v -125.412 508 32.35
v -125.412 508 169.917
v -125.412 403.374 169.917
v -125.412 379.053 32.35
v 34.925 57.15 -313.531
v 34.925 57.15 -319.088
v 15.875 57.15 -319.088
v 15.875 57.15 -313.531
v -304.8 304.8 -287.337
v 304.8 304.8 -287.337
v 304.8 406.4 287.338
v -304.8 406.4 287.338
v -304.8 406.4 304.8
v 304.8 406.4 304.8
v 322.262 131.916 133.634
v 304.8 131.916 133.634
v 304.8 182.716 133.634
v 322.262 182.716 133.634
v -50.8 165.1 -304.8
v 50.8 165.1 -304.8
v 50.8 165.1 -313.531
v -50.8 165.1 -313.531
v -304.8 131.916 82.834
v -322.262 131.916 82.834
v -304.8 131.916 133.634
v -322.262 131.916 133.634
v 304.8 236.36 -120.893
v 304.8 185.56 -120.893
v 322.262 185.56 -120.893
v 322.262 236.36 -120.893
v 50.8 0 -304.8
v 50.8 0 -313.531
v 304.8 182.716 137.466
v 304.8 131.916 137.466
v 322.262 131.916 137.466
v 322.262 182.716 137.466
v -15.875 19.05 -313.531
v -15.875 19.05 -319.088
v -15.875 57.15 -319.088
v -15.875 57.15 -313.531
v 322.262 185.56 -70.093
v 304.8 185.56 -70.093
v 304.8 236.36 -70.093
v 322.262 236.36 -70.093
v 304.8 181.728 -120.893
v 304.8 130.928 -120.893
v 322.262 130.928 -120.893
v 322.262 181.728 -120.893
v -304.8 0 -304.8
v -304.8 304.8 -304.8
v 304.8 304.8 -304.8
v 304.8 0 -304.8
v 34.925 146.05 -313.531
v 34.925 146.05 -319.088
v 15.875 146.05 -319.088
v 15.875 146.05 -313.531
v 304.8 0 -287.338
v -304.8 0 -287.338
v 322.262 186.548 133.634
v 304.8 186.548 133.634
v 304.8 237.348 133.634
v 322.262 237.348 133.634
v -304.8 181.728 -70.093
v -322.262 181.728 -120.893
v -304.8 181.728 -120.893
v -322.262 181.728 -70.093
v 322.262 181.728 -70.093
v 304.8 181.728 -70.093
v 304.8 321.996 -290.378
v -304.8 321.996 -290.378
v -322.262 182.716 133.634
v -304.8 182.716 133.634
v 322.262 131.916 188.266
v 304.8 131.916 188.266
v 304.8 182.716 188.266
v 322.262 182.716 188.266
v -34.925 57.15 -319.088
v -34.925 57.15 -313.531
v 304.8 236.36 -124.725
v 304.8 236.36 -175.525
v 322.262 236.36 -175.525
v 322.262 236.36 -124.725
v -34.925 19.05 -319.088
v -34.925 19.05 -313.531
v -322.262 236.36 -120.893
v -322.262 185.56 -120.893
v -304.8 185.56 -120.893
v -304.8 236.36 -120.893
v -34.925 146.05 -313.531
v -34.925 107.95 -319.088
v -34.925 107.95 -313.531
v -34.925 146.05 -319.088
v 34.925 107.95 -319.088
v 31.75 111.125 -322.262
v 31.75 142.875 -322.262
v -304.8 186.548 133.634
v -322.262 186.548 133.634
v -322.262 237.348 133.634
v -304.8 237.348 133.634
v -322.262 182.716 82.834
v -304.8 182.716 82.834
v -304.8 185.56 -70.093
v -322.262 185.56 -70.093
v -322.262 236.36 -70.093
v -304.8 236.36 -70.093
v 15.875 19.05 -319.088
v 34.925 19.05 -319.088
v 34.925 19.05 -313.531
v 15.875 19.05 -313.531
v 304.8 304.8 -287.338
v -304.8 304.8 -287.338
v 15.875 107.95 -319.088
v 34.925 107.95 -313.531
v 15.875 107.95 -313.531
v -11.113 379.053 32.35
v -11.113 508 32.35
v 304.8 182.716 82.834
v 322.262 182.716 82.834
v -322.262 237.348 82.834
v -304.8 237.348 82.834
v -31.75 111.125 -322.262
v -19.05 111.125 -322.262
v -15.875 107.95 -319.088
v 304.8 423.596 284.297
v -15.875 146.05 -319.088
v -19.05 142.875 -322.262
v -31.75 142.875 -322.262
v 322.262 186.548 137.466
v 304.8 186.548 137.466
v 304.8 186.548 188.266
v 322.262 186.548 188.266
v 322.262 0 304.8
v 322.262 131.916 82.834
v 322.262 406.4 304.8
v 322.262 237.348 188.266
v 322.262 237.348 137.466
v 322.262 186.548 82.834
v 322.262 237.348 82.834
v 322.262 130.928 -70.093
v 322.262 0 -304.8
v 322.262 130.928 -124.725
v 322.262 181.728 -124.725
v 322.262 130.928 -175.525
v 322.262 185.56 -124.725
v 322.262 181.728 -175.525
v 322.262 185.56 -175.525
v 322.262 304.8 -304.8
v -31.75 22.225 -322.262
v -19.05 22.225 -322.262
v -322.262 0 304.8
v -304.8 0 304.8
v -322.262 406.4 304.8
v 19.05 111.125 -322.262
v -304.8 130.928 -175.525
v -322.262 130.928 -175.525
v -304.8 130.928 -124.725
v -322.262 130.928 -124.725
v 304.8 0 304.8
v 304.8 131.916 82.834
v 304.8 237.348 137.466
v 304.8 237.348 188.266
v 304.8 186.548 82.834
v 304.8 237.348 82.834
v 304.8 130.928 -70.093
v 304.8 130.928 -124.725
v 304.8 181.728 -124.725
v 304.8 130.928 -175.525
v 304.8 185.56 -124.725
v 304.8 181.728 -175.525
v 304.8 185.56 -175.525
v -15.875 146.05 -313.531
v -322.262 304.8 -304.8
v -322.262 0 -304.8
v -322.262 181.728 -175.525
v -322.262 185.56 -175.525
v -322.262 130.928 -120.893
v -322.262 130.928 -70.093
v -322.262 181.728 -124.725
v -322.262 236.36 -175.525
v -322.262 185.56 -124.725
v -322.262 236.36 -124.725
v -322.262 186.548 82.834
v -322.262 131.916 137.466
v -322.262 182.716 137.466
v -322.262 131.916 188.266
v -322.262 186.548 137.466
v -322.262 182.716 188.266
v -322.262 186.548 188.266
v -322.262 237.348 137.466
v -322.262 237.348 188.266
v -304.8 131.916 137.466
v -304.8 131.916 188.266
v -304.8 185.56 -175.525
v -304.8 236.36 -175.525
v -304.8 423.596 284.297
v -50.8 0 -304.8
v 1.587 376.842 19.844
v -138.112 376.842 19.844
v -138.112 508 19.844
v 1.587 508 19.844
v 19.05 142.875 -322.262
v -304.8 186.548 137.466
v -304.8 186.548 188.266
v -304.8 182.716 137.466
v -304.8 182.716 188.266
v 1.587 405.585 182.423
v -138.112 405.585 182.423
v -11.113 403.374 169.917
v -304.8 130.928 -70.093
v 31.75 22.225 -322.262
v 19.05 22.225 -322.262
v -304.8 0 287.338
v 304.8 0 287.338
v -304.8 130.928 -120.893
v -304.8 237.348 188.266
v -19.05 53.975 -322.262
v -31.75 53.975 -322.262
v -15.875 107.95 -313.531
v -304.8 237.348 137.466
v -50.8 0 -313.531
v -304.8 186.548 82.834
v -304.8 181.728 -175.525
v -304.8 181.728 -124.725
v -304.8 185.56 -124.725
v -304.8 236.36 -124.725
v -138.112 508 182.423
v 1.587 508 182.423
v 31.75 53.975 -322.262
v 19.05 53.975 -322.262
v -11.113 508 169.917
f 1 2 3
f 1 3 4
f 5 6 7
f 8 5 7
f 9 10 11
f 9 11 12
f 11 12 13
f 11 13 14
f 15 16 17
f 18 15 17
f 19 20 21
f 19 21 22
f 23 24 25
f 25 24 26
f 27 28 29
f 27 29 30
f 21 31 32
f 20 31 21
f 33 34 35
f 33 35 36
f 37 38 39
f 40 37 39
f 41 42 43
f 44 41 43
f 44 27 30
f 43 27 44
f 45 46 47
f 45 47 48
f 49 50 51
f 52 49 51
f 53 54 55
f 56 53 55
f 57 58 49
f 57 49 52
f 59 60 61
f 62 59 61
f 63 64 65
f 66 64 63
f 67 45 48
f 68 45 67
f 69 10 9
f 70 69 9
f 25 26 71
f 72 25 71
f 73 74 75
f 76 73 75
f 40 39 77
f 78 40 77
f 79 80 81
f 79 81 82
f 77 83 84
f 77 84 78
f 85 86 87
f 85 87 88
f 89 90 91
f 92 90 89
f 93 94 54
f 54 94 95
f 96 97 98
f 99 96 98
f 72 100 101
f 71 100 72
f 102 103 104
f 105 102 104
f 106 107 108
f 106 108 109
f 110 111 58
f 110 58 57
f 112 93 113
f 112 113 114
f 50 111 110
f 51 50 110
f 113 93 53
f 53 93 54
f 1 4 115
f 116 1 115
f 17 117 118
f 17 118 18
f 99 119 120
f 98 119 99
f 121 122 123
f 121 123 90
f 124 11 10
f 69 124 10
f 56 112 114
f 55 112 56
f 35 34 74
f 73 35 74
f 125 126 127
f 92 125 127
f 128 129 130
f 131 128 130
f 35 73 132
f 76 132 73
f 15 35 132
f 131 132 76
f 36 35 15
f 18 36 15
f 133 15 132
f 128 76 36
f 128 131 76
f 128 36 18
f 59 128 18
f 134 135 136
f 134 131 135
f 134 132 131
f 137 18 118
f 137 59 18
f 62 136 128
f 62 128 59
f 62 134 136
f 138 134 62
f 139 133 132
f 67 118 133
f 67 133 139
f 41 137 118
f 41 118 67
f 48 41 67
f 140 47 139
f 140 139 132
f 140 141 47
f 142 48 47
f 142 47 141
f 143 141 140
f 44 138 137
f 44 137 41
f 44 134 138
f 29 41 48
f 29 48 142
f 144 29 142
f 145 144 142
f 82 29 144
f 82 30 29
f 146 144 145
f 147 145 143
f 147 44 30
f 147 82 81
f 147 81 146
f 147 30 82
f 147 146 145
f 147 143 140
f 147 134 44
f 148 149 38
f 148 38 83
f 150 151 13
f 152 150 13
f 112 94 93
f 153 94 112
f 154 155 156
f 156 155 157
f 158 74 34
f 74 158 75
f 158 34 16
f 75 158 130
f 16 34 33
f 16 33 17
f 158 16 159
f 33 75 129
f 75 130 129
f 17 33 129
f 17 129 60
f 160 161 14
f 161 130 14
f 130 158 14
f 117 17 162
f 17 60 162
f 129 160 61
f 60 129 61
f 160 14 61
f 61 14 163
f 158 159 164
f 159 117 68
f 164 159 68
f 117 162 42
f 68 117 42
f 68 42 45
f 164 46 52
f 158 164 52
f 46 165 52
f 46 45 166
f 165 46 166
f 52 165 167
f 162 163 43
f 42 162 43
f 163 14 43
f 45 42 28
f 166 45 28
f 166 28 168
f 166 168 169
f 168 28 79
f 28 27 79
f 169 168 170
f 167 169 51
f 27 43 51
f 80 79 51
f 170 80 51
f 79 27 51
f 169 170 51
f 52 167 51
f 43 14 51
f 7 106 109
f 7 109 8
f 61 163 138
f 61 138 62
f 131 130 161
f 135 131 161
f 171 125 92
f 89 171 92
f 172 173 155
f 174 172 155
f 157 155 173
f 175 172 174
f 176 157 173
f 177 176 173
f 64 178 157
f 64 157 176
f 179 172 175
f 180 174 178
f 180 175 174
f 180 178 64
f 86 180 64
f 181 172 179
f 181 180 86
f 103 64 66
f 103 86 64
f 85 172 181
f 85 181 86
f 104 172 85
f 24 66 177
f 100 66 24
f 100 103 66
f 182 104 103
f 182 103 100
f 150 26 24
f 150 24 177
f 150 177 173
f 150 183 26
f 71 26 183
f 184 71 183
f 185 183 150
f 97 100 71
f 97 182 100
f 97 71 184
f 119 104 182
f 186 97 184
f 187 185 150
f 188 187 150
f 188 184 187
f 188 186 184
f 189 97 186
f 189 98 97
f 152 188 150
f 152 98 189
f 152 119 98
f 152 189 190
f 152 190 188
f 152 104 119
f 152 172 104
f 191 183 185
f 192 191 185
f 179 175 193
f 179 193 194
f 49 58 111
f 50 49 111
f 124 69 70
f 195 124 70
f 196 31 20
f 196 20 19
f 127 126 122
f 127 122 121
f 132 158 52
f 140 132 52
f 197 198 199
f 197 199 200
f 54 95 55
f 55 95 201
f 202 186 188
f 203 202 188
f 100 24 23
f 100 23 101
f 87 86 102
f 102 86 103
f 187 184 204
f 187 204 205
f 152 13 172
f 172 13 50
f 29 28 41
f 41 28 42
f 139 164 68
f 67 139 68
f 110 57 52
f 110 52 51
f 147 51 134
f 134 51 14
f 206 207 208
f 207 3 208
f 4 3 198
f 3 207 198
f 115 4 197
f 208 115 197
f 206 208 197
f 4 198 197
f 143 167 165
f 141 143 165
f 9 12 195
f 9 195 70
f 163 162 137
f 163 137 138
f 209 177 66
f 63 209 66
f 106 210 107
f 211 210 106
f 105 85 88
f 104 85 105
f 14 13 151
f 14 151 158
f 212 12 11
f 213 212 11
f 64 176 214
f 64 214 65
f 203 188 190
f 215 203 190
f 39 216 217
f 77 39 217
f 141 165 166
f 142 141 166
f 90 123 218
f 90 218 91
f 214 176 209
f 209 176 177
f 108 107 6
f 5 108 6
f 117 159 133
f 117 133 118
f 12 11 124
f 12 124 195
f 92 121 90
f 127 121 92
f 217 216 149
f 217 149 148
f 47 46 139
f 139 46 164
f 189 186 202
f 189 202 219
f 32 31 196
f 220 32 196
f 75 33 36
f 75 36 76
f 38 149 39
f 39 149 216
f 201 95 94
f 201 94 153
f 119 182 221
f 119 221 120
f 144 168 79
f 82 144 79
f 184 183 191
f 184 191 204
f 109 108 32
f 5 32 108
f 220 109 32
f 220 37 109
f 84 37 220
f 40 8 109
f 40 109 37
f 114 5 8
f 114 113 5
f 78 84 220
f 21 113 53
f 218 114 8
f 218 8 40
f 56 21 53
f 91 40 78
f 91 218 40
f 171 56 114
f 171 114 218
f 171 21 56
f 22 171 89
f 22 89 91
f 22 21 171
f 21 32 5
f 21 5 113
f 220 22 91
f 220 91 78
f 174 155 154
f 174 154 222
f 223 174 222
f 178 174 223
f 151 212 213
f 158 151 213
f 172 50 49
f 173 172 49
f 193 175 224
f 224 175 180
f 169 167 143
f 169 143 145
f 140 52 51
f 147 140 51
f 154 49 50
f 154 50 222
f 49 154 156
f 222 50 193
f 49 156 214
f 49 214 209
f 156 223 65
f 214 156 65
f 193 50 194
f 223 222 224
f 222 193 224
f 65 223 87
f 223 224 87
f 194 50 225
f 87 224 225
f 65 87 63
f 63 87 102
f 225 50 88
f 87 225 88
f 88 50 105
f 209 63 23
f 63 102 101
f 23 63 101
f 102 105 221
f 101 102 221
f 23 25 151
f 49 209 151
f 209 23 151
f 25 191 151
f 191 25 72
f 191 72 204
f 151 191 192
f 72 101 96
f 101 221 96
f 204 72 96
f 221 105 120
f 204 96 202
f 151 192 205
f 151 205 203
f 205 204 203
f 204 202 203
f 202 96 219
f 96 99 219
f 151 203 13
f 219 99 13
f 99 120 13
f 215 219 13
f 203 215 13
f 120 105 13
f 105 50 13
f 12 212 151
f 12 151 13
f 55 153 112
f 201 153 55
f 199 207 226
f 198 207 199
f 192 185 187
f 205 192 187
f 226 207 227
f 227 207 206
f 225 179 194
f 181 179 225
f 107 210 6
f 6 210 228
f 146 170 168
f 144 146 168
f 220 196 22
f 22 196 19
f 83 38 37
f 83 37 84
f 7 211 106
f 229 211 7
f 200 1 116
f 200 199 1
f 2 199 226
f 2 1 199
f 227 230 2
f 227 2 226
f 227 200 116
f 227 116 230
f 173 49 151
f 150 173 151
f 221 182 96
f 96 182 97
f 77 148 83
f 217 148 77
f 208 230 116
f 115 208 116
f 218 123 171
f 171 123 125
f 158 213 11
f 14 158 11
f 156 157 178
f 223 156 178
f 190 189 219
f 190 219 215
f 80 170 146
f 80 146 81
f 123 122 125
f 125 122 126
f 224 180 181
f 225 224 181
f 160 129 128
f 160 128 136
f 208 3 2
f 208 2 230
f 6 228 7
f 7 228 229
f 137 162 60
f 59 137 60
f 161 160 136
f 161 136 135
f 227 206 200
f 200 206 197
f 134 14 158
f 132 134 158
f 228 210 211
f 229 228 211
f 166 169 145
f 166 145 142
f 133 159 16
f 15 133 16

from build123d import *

# Parameters (mm, degrees)
SKETCH4_W            = 609.6
SKETCH4_H            = 304.8
BOSS_EXTRUDE2_DEPTH  = 17.4625
BOSS_EXTRUDE3_DEPTH  = 17.4625
SKETCH6_W            = 609.6
SKETCH6_H            = 406.4
BOSS_EXTRUDE4_DEPTH  = 17.4625
BOSS_EXTRUDE1_DEPTH  = 17.4625
SKETCH7_W            = 609.6
SKETCH7_H            = 583.587110571
BOSS_EXTRUDE6_DEPTH  = 17.4625
BOSS_EXTRUDE7_REACH  = 620.513
SKETCH8_W            = 139.7
SKETCH8_H            = 165.1
SKETCH8_W_2          = 114.3
SKETCH8_H_2          = 139.7
SKETCH9_W            = 50.8
SKETCH9_H            = 50.8
CUT_EXTRUDE1_DEPTH   = 876.431045614
SKETCH10_W           = 101.6
SKETCH10_H           = 165.1
BOSS_EXTRUDE8_DEPTH  = 17.4625
SKETCH11_OUTSIDE_W   = 853.086
SKETCH11_OUTSIDE_H   = 716.56
SKETCH11_OUTSIDE_W_2 = 19.05
SKETCH11_OUTSIDE_H_2 = 38.1
CUT_EXTRUDE2_DEPTH   = 8.73125
CHAMFER1_SIZE        = 3.175


with BuildPart() as part:
    # Sketch4 → Boss-Extrude2 (new body)
    with BuildSketch(Plane.XY.offset(-287.3375)):
        with Locations((0, 152.4)):
            Rectangle(SKETCH4_W, SKETCH4_H)
    extrude(amount=-BOSS_EXTRUDE2_DEPTH)


with BuildPart() as body_2:
    # Sketch5 → Boss-Extrude3 (new body)
    with BuildSketch(Plane(origin=(-304.8, 0, 0), x_dir=(0, 0, -1), z_dir=(1, 0, 0))):
        Polygon((304.8, 0), (-304.8, 0), (-304.8, 406.4), (304.8, 304.8), align=None)
    extrude(amount=-BOSS_EXTRUDE3_DEPTH)


with BuildPart() as body_3:
    # Sketch6 → Boss-Extrude4 (new body)
    with BuildSketch(Plane.XY.offset(287.3375)):
        with Locations((0, 203.2)):
            Rectangle(SKETCH6_W, SKETCH6_H)
    extrude(amount=BOSS_EXTRUDE4_DEPTH)


with BuildPart() as body_4:
    # Sketch3 → Boss-Extrude1 (new body)
    with BuildSketch(Plane(origin=(304.8, 0, 0), x_dir=(0, 0, -1), z_dir=(1, 0, 0))):
        Polygon((-304.8, 0), (304.8, 0), (304.8, 304.8), (-304.8, 406.4), align=None)
    extrude(amount=BOSS_EXTRUDE1_DEPTH)


with BuildPart() as body_5:
    # Sketch7 → Boss-Extrude6 (new body)
    with BuildSketch(Plane(origin=(0, 344.822009768, -60.963007252), x_dir=(-1, 0, 0), z_dir=(0, -0.9847287398746516, 0.17409568881761794))):
        with Locations((0, -61.908426944)):
            Rectangle(SKETCH7_W, SKETCH7_H)
    extrude(amount=-BOSS_EXTRUDE6_DEPTH)


with BuildPart() as body_6:
    # Boss-Extrude7: up to this plane
    boss_extrude7_end = Plane(origin=(0, 508, 0), z_dir=(0, 1, 0))
    # Sketch8 → Boss-Extrude7 (new, up to the surface)
    with BuildSketch(Plane(origin=(0, 362.017835388, -64.003153218), x_dir=(1, 0, 0), z_dir=(0, 0.9847287398746516, -0.17409568881761792)), mode=Mode.PRIVATE) as boss_extrude7_sk1:
        with Locations((-68.2625, -167.697807849)):
            Rectangle(SKETCH8_W, SKETCH8_H)
        with Locations((-68.2625, -167.697807849)):
            Rectangle(SKETCH8_W_2, SKETCH8_H_2, mode=Mode.SUBTRACT)
    boss_extrude7_tool1 = split(extrude(boss_extrude7_sk1.sketch, amount=BOSS_EXTRUDE7_REACH, dir=(0, 1, 0), mode=Mode.PRIVATE), bisect_by=boss_extrude7_end, keep=Keep.BOTH, mode=Mode.PRIVATE)
    add(boss_extrude7_tool1.solids().sort_by_distance((-68.2625, 377.218224, 21.974045))[0])


with BuildPart() as cut_extrude1_tool:
    # Sketch9 → Cut-Extrude1 (new, through all)
    with BuildSketch(Plane.ZY.offset(322.2625)):
        with Locations((-150.124906912, 210.96048109)):
            Rectangle(SKETCH9_W, SKETCH9_H)
        with Locations((-150.124906912, 156.328437529)):
            Rectangle(SKETCH9_W, SKETCH9_H)
        with Locations((-95.492863351, 210.96048109)):
            Rectangle(SKETCH9_W, SKETCH9_H)
        with Locations((-95.492863351, 156.328437529)):
            Rectangle(SKETCH9_W, SKETCH9_H)
        with Locations((108.233894506, 157.315605476)):
            Rectangle(SKETCH9_W, SKETCH9_H)
        with Locations((108.233894506, 211.947649037)):
            Rectangle(SKETCH9_W, SKETCH9_H)
        with Locations((162.865938066, 211.947649037)):
            Rectangle(SKETCH9_W, SKETCH9_H)
        with Locations((162.865938066, 157.315605476)):
            Rectangle(SKETCH9_W, SKETCH9_H)
    extrude(amount=-CUT_EXTRUDE1_DEPTH)


with BuildPart() as body_2_1:
    add(body_2.part)

    # Cut-Extrude1: cut by cut_extrude1_tool
    add(cut_extrude1_tool.part, mode=Mode.SUBTRACT)


with BuildPart() as body_4_1:
    add(body_4.part)

    # Cut-Extrude1: cut by cut_extrude1_tool
    add(cut_extrude1_tool.part, mode=Mode.SUBTRACT)


with BuildPart() as body_7:
    # Sketch10 → Boss-Extrude8 (new body)
    with BuildSketch(Plane(origin=(0, 0, -304.8), x_dir=(-1, 0, 0), z_dir=(0, 0, -1))):
        with Locations((0, 82.55)):
            Rectangle(SKETCH10_W, SKETCH10_H)
    extrude(amount=BOSS_EXTRUDE8_DEPTH)

    # Sketch11 outside → Cut-Extrude2 (cut)
    with BuildSketch(Plane(origin=(0, 0, -322.2625), x_dir=(-1, 0, 0), z_dir=(0, 0, -1))):
        with Locations((0, 254)):
            Rectangle(SKETCH11_OUTSIDE_W, SKETCH11_OUTSIDE_H)
        with Locations((-25.4, 127)):
            Rectangle(SKETCH11_OUTSIDE_W_2, SKETCH11_OUTSIDE_H_2, mode=Mode.SUBTRACT)
        with Locations((25.4, 127)):
            Rectangle(SKETCH11_OUTSIDE_W_2, SKETCH11_OUTSIDE_H_2, mode=Mode.SUBTRACT)
        with Locations((25.4, 38.1)):
            Rectangle(SKETCH11_OUTSIDE_W_2, SKETCH11_OUTSIDE_H_2, mode=Mode.SUBTRACT)
        with Locations((-25.4, 38.1)):
            Rectangle(SKETCH11_OUTSIDE_W_2, SKETCH11_OUTSIDE_H_2, mode=Mode.SUBTRACT)
    extrude(amount=-CUT_EXTRUDE2_DEPTH, mode=Mode.SUBTRACT)

    # Chamfer1
    chamfer1_edges = [body_7.edges().sort_by_distance(p)[0] for p in [
        (15.875, 127, -322.2625),
        (25.4, 107.95, -322.2625),
        (34.925, 127, -322.2625),
        (25.4, 146.05, -322.2625),
        (-34.925, 127, -322.2625),
        (-25.4, 107.95, -322.2625),
        (-15.875, 127, -322.2625),
        (-25.4, 146.05, -322.2625),
        (-15.875, 38.1, -322.2625),
        (-25.4, 57.15, -322.2625),
        (-34.925, 38.1, -322.2625),
        (-25.4, 19.05, -322.2625),
        (34.925, 38.1, -322.2625),
        (25.4, 57.15, -322.2625),
        (15.875, 38.1, -322.2625),
        (25.4, 19.05, -322.2625),
    ]]
    chamfer(chamfer1_edges, length=CHAMFER1_SIZE)


solid = Compound([part.part, body_3.part, body_5.part, body_6.part, body_2_1.part, body_4_1.part, body_7.part])
